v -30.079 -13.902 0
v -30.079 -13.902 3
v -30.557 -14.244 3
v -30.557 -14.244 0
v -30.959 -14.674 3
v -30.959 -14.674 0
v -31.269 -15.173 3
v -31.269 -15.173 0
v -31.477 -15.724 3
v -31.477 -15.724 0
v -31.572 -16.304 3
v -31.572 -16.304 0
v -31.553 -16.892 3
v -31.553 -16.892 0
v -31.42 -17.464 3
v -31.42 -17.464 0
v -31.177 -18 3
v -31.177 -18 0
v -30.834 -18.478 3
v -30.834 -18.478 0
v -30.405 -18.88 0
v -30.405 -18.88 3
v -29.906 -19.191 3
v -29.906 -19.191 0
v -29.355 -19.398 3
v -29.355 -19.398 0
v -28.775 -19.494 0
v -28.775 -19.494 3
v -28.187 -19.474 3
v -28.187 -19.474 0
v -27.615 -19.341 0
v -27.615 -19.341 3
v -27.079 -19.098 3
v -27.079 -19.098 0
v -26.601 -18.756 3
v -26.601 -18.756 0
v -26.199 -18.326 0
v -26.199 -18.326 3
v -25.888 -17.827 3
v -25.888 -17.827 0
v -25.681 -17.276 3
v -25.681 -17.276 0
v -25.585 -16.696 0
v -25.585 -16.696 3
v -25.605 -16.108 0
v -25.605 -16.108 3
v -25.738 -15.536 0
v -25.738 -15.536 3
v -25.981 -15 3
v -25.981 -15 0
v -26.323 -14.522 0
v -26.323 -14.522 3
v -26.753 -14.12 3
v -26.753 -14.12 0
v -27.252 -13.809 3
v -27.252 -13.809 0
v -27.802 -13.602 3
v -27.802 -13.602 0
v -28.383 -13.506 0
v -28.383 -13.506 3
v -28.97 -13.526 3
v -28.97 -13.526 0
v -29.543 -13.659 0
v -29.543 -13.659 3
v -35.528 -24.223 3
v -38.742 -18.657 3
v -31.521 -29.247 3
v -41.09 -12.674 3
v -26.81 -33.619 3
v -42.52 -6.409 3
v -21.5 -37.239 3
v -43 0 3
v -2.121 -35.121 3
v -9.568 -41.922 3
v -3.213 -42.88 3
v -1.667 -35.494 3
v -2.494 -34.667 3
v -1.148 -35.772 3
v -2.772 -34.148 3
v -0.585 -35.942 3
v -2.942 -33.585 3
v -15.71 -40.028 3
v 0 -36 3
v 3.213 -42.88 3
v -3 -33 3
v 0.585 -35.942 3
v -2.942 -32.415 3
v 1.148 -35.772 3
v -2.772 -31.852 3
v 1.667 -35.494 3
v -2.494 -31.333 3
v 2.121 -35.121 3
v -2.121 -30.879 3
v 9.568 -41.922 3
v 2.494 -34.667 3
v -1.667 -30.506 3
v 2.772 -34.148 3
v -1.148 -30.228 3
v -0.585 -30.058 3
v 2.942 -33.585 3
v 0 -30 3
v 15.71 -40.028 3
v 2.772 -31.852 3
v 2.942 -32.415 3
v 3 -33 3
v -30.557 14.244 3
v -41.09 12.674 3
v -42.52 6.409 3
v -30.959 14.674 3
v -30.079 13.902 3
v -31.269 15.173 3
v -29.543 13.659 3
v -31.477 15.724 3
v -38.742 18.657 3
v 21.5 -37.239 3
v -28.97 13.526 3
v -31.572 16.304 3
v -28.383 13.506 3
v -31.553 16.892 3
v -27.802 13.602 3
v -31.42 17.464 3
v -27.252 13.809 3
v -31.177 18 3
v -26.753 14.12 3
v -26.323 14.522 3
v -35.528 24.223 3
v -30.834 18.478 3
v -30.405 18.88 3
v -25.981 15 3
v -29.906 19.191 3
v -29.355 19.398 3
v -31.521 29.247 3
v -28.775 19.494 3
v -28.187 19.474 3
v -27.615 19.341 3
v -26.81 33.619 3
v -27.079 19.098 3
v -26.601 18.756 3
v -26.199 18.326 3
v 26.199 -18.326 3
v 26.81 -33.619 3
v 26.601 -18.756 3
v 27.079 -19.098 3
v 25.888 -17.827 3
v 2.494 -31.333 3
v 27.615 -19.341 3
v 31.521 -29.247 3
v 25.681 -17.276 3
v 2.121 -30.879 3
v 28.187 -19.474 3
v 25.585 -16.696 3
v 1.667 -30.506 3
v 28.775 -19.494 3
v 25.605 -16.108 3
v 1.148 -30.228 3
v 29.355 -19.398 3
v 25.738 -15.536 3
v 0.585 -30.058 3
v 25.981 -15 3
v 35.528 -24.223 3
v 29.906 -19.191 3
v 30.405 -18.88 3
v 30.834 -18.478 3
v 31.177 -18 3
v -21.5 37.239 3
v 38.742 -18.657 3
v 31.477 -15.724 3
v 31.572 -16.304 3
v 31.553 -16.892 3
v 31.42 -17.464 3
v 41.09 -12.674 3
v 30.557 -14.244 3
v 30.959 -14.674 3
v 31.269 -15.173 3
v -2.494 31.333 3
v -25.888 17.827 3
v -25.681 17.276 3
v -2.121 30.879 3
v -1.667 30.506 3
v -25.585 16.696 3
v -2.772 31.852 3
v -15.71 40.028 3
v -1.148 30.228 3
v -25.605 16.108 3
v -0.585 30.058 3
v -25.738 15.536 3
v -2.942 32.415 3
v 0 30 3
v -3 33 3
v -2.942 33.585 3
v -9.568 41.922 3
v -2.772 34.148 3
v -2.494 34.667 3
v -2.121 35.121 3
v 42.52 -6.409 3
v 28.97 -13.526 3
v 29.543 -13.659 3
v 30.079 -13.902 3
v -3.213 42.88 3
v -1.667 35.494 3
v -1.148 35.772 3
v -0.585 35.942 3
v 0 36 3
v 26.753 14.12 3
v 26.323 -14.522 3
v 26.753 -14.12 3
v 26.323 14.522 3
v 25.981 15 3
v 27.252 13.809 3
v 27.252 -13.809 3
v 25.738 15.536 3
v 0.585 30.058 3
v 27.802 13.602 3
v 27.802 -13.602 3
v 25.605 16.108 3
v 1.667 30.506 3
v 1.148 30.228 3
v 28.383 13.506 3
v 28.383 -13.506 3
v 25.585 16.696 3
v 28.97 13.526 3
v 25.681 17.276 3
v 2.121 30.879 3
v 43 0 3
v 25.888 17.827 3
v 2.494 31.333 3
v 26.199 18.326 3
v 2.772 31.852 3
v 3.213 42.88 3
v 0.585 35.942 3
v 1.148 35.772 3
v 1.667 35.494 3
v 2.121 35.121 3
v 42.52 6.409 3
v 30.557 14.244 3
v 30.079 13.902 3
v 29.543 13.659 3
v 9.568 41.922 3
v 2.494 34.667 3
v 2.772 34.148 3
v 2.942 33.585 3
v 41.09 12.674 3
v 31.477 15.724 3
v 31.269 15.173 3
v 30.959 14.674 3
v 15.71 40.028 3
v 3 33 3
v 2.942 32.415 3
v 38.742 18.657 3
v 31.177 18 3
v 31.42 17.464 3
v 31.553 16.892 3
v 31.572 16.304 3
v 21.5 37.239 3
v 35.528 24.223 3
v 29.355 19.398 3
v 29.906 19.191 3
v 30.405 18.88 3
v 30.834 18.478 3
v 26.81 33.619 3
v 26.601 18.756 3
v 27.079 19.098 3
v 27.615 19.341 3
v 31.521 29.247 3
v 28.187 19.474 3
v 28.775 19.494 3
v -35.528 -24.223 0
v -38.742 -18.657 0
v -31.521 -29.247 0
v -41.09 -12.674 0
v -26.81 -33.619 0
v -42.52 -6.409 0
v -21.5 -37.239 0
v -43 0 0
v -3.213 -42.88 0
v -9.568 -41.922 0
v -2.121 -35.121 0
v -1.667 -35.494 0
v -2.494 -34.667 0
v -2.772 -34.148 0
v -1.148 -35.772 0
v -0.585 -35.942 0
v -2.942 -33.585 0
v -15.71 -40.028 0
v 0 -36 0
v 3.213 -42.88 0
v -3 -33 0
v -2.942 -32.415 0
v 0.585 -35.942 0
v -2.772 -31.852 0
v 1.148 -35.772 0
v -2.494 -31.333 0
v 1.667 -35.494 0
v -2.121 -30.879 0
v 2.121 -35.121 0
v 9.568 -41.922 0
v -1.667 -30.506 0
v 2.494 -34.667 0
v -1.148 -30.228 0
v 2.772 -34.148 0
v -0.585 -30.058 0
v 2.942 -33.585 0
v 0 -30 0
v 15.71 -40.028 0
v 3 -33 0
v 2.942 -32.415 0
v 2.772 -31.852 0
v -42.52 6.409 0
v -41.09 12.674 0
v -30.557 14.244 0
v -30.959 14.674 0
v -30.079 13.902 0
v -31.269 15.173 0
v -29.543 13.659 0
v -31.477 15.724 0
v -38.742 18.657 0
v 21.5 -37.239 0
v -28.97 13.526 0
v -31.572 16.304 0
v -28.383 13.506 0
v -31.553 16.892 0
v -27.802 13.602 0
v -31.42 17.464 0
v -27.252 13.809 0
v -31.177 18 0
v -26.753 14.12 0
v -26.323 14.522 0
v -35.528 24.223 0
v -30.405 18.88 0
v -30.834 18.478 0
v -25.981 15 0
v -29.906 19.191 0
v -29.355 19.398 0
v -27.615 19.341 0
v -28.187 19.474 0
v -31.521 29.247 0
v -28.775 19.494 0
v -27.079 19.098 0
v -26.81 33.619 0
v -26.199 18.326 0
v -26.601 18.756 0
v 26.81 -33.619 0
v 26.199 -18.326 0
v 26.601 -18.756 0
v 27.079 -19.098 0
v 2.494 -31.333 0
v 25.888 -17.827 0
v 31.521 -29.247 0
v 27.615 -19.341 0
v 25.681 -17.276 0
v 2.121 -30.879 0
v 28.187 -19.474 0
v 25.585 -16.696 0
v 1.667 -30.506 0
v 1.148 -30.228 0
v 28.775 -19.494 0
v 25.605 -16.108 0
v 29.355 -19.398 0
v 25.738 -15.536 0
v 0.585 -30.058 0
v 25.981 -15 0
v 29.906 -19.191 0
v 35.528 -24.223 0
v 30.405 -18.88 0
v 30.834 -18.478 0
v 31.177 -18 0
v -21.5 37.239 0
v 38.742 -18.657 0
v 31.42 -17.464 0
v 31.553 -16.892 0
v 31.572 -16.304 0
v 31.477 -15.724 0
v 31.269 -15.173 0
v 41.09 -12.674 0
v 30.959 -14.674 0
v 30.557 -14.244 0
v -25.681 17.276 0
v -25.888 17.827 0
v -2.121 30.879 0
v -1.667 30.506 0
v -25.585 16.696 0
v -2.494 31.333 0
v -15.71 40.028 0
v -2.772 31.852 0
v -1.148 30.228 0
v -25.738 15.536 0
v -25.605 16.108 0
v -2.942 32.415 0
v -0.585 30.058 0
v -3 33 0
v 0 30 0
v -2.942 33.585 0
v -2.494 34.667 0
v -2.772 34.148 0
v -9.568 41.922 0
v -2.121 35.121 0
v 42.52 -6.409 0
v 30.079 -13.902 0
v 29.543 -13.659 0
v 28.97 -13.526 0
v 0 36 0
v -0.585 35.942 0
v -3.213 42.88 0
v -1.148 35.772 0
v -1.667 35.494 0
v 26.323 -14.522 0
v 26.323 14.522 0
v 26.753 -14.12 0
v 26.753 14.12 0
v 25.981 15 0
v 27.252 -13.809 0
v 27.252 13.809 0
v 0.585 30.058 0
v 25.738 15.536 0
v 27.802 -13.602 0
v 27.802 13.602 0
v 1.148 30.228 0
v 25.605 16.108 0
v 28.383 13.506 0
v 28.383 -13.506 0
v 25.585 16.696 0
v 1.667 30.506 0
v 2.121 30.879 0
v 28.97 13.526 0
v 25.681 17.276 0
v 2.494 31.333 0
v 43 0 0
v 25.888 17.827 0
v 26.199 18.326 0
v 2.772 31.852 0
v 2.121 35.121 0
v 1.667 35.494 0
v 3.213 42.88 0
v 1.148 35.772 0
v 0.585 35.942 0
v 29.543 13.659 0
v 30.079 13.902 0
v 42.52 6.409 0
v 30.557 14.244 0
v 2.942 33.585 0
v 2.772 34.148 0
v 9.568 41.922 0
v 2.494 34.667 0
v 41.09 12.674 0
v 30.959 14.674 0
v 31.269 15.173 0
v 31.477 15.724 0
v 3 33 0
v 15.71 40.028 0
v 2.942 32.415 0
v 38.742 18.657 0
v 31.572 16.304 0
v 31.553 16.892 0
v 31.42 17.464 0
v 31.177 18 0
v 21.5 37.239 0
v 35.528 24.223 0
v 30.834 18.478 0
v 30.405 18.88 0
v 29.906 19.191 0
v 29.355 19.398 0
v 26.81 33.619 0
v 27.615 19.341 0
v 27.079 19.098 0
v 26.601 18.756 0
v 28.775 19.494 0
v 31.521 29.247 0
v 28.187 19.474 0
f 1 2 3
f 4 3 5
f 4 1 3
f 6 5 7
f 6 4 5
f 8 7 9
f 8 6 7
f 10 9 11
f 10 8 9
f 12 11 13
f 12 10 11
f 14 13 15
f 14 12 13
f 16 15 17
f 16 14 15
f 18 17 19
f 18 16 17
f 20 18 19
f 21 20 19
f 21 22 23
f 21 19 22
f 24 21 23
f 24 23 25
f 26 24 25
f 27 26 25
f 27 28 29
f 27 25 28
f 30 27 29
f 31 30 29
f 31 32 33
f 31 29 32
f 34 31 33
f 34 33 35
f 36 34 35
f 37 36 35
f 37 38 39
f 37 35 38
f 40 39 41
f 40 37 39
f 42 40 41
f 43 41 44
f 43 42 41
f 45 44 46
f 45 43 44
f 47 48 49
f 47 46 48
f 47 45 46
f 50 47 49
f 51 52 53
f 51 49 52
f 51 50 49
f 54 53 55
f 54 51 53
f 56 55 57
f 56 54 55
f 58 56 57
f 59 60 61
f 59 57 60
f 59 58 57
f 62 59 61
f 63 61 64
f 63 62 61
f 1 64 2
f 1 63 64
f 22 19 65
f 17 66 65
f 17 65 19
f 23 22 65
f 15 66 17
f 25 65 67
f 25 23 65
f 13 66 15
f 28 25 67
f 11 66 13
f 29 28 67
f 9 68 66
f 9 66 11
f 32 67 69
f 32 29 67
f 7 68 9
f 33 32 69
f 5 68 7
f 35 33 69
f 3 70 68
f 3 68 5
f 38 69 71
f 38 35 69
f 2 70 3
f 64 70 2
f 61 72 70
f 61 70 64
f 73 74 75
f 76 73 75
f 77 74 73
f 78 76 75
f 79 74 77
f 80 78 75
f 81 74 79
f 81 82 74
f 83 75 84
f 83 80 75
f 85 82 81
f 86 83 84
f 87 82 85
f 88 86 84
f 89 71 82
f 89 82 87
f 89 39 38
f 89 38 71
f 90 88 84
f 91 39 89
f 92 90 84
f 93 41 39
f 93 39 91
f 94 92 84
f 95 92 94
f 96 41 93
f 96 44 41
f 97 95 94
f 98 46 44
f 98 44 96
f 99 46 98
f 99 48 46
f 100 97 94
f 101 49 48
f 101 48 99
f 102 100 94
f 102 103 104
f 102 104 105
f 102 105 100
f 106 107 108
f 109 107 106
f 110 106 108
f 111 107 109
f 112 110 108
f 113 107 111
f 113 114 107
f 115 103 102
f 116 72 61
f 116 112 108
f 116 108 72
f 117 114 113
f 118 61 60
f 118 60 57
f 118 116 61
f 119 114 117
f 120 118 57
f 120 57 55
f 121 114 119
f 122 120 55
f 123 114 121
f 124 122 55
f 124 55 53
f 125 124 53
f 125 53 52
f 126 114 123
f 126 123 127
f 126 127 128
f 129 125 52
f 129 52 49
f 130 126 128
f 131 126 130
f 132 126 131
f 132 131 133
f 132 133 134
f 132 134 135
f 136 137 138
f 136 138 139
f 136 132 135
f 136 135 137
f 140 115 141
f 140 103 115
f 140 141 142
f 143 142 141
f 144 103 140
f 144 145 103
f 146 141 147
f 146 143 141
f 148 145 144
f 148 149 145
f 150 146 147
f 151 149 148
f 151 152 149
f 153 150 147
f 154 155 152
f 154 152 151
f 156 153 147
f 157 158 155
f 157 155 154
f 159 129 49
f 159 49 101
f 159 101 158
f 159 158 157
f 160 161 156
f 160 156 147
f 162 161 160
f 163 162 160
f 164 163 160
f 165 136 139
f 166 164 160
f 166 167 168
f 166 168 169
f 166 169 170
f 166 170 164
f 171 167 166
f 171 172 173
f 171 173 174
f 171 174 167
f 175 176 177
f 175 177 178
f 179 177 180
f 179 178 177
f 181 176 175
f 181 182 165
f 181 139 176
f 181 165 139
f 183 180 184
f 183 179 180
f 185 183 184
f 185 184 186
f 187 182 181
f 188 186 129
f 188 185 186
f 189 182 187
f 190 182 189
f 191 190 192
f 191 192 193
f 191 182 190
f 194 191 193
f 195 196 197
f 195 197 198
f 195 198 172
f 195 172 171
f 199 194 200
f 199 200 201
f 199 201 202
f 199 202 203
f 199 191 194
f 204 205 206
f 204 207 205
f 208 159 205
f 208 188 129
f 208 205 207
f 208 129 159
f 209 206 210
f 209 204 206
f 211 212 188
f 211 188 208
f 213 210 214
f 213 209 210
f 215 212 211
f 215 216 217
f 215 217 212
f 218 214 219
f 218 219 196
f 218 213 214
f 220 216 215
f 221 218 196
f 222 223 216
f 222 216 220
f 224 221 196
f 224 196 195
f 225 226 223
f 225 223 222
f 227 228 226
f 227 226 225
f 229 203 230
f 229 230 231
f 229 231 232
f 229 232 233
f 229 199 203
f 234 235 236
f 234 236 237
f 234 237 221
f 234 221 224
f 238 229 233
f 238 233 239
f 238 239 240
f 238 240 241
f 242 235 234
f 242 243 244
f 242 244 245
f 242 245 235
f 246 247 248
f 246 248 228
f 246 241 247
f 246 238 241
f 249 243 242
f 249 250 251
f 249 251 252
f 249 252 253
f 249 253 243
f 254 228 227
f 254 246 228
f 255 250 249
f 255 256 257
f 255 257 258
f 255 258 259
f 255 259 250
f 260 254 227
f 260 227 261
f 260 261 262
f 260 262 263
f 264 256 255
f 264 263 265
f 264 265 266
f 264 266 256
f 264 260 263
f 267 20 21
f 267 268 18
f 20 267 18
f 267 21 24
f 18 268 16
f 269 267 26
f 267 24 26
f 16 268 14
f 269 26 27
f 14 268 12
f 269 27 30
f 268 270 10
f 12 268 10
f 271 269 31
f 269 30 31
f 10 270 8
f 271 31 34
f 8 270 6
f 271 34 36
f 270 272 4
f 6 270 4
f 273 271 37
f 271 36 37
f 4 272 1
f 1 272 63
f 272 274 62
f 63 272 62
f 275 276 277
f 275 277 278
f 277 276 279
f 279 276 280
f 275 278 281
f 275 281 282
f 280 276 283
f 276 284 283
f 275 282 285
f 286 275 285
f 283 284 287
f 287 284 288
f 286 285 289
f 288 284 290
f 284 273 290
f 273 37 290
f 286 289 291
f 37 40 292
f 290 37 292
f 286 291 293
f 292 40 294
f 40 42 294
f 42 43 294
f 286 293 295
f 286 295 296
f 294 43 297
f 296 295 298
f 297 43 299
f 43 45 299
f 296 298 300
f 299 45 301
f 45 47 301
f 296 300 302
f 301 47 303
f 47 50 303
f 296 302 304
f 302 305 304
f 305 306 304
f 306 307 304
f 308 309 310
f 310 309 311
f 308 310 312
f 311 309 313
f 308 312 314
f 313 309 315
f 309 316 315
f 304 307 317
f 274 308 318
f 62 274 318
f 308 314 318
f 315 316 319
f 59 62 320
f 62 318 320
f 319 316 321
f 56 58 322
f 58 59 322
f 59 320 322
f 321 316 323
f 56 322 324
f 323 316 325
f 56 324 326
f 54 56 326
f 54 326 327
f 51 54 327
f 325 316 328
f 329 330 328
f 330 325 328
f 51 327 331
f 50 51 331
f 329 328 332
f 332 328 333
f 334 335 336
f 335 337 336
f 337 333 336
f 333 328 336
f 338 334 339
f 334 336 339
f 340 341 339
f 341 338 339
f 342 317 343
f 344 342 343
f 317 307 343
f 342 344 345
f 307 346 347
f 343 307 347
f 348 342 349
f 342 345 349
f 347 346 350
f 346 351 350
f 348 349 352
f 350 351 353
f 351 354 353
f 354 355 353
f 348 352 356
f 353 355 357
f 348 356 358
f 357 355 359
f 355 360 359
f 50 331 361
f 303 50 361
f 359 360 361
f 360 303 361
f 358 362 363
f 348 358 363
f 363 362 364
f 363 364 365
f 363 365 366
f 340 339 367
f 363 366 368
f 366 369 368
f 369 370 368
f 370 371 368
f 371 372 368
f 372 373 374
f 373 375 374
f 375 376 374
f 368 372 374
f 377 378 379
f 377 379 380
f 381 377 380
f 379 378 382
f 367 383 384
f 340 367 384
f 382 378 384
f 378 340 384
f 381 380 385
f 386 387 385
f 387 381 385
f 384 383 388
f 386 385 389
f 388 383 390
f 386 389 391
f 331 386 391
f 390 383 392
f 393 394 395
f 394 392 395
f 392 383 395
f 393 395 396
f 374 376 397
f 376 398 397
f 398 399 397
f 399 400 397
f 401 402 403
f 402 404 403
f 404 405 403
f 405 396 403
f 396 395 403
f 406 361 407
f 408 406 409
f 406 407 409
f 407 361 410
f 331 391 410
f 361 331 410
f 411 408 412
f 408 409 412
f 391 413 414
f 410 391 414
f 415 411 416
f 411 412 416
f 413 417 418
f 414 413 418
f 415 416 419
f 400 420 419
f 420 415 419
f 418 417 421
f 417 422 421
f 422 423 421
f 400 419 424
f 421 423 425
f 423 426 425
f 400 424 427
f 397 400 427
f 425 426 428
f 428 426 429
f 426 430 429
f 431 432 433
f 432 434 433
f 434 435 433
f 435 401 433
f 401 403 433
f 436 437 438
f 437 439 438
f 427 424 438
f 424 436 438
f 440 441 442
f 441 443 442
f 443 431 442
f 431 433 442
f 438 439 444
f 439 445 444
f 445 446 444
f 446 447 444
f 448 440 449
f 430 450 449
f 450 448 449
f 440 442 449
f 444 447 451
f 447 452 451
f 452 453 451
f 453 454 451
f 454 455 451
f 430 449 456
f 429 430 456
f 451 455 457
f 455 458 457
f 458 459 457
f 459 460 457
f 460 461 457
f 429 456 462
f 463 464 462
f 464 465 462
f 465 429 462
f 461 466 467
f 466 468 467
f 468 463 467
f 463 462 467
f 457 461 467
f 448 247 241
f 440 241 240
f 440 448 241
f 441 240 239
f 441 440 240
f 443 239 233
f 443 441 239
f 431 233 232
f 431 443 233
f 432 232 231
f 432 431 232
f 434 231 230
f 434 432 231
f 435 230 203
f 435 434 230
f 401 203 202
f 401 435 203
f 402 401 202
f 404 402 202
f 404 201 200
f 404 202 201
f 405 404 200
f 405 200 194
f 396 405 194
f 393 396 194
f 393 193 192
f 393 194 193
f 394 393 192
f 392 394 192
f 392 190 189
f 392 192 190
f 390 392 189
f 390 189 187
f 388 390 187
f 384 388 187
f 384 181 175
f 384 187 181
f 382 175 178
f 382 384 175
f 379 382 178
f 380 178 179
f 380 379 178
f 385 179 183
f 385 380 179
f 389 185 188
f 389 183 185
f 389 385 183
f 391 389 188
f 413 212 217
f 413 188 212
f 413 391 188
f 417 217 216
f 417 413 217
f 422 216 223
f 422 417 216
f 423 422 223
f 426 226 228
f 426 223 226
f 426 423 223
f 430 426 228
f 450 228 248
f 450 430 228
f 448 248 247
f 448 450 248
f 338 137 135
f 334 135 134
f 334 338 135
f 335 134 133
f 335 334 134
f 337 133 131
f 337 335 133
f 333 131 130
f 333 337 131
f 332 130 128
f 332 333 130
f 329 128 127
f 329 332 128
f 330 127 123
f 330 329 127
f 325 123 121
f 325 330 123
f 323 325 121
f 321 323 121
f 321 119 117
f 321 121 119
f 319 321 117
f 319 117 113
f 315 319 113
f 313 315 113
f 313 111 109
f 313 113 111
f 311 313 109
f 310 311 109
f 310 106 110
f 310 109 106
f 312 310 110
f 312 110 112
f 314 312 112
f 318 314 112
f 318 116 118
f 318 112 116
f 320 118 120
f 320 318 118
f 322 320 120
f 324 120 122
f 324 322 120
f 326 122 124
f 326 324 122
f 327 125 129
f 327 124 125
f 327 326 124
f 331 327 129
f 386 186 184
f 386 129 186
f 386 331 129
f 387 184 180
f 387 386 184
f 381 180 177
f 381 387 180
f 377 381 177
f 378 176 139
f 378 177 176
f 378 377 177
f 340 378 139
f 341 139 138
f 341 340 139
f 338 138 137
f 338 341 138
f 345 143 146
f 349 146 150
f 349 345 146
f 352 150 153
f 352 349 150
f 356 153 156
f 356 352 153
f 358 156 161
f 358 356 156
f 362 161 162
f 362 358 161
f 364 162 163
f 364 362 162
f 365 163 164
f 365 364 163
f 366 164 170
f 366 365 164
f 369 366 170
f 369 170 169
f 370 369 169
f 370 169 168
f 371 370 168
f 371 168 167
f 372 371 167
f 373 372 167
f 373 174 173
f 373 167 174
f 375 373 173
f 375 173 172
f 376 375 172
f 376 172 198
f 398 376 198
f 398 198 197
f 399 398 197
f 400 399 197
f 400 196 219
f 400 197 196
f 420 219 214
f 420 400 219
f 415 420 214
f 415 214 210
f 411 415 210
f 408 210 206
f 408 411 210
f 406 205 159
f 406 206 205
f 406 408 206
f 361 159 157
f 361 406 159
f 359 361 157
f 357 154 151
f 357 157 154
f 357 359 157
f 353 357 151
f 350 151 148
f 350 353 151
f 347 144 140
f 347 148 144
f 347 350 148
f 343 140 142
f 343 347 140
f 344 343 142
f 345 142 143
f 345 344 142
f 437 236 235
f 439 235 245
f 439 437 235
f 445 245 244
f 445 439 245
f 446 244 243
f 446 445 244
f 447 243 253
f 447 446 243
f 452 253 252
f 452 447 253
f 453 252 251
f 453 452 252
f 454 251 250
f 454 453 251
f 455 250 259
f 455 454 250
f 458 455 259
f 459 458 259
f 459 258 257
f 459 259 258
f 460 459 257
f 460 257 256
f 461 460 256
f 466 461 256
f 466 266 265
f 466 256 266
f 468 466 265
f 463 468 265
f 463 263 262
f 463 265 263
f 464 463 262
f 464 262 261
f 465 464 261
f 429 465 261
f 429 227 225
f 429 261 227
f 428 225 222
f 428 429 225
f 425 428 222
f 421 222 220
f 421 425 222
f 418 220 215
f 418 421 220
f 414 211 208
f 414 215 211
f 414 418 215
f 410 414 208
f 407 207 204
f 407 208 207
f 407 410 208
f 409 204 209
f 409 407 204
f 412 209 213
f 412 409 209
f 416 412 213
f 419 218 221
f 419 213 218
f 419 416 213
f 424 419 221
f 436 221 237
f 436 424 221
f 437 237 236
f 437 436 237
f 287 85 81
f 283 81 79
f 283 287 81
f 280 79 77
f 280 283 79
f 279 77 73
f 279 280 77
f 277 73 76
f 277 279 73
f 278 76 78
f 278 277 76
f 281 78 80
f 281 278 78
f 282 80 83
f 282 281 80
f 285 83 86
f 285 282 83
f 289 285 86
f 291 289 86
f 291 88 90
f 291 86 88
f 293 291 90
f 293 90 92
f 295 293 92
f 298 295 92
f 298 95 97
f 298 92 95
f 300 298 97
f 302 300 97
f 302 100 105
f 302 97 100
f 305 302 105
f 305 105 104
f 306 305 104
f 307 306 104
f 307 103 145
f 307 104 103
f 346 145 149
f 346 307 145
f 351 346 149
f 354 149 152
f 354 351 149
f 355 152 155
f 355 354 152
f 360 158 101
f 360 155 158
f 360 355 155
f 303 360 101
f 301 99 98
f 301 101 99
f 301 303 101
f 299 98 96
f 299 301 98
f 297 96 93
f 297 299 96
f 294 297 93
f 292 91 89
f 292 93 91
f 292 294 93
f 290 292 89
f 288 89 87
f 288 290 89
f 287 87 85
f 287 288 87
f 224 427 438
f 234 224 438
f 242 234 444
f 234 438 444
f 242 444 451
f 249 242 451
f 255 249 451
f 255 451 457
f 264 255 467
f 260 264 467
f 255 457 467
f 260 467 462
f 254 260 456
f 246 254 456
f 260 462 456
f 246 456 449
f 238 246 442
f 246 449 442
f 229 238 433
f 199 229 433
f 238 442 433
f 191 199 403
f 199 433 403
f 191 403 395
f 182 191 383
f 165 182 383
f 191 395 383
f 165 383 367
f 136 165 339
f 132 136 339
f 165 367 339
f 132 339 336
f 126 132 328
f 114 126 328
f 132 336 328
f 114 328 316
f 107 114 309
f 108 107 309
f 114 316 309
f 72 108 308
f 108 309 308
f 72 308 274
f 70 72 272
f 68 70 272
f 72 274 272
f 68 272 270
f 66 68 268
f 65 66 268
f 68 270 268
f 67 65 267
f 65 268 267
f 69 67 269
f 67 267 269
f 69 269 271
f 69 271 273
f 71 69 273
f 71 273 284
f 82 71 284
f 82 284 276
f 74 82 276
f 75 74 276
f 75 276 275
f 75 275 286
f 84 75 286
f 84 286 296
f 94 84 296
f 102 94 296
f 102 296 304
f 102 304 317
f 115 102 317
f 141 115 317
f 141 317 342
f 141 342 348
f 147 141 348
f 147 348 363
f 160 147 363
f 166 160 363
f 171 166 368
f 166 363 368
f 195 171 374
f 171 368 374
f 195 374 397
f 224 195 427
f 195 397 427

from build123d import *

# Parameters (mm, degrees)
SKETCH1_R           = 43
BOSS_EXTRUDE2_DEPTH = 3
SKETCH1_3_R         = 3
CUT_EXTRUDE1_DEPTH  = 61.88513776
CIRPATTERN2_COUNT   = 6


with BuildPart() as part:
    # Sketch1 → Boss-Extrude2 (new body)
    with BuildSketch(Plane.XY):
        Circle(SKETCH1_R)
    extrude(amount=BOSS_EXTRUDE2_DEPTH)

    # Sketch1<3> → Cut-Extrude1 (cut, through all)
    with BuildSketch(Plane.XY):
        with Locations((0, 33)):
            Circle(SKETCH1_3_R)
    cut_extrude1 = extrude(amount=CUT_EXTRUDE1_DEPTH, mode=Mode.SUBTRACT)

    # CirPattern2: Cut-Extrude1 ×6 about axis
    cirpattern2_axis = Axis((0, 0, 3), (0, 0, -1))
    for i in range(1, CIRPATTERN2_COUNT):
        add(cut_extrude1.rotate(cirpattern2_axis, i * 360 / CIRPATTERN2_COUNT), mode=Mode.SUBTRACT)


solid = part.part
